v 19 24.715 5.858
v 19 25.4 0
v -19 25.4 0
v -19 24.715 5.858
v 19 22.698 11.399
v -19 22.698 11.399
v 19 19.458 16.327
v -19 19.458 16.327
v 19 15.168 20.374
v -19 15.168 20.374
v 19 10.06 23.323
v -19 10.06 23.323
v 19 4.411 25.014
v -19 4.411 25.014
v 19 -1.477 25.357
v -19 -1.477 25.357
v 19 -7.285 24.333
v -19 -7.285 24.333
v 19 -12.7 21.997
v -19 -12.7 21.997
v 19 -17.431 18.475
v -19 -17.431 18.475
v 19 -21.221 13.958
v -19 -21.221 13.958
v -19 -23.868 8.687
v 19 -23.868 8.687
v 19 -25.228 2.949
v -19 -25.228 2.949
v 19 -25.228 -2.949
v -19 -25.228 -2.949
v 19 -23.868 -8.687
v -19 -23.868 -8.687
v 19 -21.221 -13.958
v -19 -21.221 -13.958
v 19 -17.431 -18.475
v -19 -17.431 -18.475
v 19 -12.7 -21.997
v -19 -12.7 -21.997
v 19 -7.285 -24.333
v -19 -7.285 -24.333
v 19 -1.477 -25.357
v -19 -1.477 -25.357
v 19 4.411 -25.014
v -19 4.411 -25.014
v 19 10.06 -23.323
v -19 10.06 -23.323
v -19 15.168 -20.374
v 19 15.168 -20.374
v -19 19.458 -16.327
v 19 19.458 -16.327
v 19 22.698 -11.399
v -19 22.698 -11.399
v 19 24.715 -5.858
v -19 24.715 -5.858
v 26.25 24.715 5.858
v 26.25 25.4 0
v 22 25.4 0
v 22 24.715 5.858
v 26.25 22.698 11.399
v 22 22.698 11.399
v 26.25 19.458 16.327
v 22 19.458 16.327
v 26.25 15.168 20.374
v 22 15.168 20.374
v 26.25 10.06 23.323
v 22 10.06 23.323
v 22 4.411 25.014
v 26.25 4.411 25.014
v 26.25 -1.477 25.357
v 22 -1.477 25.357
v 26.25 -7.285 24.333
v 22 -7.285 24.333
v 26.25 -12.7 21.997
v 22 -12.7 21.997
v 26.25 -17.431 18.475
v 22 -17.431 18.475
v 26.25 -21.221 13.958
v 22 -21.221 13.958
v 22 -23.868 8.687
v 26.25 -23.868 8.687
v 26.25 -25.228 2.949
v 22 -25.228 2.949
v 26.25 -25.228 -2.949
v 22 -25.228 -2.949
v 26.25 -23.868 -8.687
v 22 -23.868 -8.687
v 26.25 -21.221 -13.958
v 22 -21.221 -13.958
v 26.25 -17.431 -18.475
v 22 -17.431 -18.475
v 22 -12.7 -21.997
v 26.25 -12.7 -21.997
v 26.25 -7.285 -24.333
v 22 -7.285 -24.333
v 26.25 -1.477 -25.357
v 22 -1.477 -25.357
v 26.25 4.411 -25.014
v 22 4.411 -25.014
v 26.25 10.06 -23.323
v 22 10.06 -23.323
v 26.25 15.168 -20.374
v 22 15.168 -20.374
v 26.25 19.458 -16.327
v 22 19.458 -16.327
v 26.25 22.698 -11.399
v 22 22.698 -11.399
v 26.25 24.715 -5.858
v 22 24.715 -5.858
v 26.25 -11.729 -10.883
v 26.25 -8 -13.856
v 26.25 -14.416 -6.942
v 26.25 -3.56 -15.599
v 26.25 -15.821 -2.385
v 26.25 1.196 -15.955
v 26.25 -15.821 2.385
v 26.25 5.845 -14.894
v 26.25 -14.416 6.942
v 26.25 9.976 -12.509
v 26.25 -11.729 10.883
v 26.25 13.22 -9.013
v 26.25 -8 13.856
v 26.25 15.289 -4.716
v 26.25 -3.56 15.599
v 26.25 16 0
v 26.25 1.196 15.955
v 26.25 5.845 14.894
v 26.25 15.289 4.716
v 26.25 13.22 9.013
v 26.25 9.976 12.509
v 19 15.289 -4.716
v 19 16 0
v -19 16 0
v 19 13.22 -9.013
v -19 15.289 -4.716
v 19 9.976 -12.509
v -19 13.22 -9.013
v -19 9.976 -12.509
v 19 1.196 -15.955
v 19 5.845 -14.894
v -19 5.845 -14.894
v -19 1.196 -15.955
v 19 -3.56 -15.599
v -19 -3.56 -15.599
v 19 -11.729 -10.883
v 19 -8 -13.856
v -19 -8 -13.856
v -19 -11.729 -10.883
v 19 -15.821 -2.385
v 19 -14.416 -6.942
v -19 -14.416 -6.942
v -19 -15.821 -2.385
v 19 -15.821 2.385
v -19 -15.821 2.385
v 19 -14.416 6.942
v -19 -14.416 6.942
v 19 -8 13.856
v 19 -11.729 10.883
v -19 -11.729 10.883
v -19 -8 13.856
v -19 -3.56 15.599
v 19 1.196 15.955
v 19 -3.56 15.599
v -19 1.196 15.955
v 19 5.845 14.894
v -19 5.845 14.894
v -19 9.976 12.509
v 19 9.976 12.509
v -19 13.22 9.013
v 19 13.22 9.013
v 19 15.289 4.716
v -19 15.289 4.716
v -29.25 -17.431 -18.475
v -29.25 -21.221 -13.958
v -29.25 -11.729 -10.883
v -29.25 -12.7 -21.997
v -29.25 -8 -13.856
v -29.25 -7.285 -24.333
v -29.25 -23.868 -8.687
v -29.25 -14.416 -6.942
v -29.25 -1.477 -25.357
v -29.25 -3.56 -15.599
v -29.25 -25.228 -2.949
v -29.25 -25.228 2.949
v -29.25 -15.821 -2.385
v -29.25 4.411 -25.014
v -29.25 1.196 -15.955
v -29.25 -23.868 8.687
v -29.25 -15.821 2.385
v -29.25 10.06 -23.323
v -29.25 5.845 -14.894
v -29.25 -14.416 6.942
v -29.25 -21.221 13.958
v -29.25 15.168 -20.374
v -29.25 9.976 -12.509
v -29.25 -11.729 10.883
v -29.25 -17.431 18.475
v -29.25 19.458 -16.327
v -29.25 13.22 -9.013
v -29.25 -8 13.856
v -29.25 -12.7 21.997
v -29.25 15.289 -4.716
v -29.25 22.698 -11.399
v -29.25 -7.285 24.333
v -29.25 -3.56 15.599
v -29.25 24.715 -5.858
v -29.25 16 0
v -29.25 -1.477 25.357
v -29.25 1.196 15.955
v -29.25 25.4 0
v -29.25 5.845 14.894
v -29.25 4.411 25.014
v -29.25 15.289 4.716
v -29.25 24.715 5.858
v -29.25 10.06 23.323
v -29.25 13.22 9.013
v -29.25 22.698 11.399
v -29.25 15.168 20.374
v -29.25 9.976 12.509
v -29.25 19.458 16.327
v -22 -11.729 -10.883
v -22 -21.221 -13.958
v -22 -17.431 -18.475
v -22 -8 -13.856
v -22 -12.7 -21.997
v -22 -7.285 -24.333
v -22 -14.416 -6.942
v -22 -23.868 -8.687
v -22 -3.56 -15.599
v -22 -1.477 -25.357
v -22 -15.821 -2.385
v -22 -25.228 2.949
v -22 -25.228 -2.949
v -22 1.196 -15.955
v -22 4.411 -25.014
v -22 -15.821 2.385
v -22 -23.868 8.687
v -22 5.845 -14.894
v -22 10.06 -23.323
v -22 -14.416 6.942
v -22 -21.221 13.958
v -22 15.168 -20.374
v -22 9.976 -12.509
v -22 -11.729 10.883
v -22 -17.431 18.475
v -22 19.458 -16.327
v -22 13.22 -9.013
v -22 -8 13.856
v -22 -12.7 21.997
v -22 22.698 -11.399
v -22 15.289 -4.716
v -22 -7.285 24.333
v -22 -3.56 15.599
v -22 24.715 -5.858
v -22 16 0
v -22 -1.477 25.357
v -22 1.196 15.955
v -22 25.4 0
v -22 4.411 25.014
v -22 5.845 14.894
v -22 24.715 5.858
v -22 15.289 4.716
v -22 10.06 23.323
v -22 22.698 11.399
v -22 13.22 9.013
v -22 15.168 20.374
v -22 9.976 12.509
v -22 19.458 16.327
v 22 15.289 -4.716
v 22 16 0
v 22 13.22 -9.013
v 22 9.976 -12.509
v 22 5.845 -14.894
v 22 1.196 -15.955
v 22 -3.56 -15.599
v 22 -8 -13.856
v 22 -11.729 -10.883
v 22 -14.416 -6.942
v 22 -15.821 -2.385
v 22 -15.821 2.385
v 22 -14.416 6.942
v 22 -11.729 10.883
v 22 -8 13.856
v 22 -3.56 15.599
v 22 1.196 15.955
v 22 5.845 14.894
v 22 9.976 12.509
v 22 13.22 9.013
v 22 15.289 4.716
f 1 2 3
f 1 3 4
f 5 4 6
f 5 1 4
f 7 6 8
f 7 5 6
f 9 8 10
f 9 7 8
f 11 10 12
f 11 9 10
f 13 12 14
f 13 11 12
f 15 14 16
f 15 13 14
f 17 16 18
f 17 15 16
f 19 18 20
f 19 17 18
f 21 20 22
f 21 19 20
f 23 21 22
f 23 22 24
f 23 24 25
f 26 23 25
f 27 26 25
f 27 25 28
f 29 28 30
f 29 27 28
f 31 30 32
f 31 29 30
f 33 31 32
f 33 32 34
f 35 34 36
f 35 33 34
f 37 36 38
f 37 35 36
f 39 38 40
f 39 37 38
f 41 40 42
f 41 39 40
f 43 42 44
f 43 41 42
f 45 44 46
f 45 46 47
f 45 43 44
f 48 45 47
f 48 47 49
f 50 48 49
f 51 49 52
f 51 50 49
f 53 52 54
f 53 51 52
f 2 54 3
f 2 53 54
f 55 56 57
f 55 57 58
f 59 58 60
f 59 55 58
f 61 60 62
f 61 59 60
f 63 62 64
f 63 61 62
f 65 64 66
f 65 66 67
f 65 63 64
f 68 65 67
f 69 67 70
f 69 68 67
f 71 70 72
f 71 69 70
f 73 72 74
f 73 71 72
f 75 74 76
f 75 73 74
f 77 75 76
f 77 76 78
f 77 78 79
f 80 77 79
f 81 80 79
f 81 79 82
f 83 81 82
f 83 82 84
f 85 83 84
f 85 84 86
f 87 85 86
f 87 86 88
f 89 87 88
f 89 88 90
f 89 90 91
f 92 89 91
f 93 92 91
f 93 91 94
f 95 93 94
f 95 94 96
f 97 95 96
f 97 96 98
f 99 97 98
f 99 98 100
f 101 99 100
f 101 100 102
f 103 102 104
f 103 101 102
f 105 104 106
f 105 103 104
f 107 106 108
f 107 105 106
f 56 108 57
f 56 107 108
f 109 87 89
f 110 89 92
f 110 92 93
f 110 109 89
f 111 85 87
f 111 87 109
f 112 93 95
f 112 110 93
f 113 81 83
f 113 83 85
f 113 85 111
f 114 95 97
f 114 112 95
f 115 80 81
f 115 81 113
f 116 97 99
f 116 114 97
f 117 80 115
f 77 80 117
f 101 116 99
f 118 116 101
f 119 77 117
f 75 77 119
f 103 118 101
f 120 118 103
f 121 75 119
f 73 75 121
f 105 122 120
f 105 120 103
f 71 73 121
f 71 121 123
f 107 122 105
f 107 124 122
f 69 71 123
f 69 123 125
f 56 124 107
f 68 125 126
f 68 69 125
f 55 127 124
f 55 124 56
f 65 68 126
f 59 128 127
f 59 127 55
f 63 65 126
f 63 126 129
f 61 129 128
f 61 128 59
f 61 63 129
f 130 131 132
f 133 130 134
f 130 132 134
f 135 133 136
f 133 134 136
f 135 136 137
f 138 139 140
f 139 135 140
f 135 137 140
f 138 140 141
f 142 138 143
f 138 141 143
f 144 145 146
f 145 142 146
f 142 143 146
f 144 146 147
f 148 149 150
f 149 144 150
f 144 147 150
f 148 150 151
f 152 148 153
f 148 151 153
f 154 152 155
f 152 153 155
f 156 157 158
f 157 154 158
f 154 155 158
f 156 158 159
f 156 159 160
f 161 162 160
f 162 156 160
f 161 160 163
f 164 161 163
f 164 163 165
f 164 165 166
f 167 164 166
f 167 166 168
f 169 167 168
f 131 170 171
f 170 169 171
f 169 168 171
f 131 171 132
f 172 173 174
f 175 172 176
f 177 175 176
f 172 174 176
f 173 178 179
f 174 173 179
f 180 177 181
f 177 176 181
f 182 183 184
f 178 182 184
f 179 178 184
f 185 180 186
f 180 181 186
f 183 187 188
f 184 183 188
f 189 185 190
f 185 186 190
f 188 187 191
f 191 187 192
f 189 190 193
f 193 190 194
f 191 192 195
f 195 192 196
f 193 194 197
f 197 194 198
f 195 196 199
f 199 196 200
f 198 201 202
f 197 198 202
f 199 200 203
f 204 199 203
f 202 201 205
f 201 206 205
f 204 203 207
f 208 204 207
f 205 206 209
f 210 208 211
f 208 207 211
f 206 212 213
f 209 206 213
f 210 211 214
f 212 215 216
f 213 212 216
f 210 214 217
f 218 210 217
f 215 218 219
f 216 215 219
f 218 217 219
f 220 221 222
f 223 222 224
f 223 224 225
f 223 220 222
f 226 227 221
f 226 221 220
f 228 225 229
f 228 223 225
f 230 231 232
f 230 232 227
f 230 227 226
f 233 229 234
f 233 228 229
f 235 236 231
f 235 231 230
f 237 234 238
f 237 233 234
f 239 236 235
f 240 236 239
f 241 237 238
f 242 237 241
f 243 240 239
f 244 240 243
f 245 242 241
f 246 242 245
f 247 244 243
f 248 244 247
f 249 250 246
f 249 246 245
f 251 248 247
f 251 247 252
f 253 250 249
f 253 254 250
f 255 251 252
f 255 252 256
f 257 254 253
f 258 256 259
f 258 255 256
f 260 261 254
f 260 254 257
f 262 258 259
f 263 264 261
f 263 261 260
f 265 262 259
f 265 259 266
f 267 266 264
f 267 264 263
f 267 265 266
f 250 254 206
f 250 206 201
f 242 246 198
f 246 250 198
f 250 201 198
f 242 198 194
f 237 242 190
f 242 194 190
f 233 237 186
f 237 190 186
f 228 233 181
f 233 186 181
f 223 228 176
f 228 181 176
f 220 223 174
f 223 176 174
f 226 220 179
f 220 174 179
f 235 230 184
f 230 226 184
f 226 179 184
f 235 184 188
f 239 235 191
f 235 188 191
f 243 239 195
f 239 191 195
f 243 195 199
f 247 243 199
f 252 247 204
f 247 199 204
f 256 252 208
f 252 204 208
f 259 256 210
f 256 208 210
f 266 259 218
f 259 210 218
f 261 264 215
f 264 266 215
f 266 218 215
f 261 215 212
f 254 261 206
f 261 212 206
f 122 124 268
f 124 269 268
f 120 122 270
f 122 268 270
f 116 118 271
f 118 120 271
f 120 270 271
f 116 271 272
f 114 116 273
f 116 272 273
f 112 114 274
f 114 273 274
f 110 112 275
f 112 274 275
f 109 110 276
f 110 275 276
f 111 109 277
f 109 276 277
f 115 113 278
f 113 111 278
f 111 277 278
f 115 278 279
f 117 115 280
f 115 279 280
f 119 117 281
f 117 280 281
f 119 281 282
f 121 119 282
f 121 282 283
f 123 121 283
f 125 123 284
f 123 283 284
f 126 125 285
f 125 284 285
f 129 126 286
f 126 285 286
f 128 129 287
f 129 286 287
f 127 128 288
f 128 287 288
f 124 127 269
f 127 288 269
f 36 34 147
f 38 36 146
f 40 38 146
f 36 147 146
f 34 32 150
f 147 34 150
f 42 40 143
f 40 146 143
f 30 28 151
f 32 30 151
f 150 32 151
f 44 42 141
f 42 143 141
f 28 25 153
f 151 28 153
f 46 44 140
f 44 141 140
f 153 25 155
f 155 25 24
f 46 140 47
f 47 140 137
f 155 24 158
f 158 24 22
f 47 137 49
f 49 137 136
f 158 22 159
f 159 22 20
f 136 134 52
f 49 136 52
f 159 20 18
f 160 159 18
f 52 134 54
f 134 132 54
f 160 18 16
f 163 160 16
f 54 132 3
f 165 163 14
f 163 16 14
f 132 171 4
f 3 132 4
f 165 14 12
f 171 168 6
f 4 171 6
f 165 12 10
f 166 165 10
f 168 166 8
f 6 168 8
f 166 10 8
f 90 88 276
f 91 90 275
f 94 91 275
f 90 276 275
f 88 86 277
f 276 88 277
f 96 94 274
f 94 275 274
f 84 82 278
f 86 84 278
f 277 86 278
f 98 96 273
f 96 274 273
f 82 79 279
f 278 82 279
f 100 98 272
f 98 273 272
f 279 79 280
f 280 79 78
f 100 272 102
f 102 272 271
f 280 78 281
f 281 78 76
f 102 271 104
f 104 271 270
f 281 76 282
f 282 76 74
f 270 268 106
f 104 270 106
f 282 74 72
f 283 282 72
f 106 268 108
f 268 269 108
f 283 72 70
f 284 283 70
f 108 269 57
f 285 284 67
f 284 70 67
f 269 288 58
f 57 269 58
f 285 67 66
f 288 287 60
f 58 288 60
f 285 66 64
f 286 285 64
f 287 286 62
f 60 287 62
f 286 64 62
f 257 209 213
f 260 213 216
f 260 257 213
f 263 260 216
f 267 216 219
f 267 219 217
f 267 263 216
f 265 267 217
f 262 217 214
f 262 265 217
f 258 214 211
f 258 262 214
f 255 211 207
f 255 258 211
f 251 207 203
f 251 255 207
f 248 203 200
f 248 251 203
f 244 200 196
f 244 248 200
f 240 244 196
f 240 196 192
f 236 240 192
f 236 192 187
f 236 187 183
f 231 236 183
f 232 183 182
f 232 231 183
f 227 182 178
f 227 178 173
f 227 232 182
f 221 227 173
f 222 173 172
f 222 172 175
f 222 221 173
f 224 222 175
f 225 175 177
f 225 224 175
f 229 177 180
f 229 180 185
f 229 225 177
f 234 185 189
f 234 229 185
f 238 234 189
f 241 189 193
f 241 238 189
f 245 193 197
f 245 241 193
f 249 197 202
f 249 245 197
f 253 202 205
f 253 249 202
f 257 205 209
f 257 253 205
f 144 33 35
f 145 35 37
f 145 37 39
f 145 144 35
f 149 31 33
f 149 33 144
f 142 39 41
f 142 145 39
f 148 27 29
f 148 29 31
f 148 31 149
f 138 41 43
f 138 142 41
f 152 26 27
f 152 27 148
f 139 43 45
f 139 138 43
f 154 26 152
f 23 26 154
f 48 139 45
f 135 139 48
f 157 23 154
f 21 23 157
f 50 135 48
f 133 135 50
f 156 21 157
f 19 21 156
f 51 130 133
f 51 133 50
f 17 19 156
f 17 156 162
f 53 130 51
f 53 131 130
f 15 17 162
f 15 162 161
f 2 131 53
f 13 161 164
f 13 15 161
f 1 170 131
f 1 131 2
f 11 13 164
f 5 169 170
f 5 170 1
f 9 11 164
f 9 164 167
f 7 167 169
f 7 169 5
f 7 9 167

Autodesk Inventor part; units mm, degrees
ref_plane "YZ Plane" through (0, 0, 0) normal (1, 0, 0) x (0, 1, 0)
ref_plane "XZ Plane" through (0, 0, 0) normal (0, 1, 0) x (-1, 0, 0)
ref_plane "XY Plane" through (0, 0, 0) normal (0, 0, 1) x (1, 0, 0)
sketch "Sketch1" plane through (0, 0, 0) normal (0, 0, 1) x (1, 0, 0)
  line L0 (-29.25, 25.4) -> (-22, 25.4)
  line L1 (-22, 25.4) -> (-22, 16)
  line L2 (-22, 16) -> (-29.25, 16)
  line L3 (-29.25, 16) -> (-29.25, 25.4)
  line L4 (-19, 25.4) -> (19, 25.4)
  line L5 (19, 25.4) -> (19, 16)
  line L6 (19, 16) -> (-19, 16)
  line L7 (-19, 16) -> (-19, 25.4)
  line L8 (22, 25.4) -> (26.25, 25.4)
  line L9 (26.25, 25.4) -> (26.25, 16)
  line L10 (26.25, 16) -> (22, 16)
  line L11 (22, 16) -> (22, 25.4)
  line L12 (-29.25, 0) -> (26.25, 0)
  line L13 (0, 16) -> (0, 0) construction
  dimension "d0" = 3
  dimension "d1" = 3
  dimension "d2" = 38
  dimension "d3" = 7.25
  dimension "d4" = 50.8
  dimension "d5" = 32
  dimension "d6" = 26.25
revolve "Revolution1" add sketch "Sketch1" angle 360 about axis through (-29.25, 0, 0) along (1, 0, 0)
equation "\"d1\" = d0"
properties part number "baseSpacers" material "Aluminum 6061"
